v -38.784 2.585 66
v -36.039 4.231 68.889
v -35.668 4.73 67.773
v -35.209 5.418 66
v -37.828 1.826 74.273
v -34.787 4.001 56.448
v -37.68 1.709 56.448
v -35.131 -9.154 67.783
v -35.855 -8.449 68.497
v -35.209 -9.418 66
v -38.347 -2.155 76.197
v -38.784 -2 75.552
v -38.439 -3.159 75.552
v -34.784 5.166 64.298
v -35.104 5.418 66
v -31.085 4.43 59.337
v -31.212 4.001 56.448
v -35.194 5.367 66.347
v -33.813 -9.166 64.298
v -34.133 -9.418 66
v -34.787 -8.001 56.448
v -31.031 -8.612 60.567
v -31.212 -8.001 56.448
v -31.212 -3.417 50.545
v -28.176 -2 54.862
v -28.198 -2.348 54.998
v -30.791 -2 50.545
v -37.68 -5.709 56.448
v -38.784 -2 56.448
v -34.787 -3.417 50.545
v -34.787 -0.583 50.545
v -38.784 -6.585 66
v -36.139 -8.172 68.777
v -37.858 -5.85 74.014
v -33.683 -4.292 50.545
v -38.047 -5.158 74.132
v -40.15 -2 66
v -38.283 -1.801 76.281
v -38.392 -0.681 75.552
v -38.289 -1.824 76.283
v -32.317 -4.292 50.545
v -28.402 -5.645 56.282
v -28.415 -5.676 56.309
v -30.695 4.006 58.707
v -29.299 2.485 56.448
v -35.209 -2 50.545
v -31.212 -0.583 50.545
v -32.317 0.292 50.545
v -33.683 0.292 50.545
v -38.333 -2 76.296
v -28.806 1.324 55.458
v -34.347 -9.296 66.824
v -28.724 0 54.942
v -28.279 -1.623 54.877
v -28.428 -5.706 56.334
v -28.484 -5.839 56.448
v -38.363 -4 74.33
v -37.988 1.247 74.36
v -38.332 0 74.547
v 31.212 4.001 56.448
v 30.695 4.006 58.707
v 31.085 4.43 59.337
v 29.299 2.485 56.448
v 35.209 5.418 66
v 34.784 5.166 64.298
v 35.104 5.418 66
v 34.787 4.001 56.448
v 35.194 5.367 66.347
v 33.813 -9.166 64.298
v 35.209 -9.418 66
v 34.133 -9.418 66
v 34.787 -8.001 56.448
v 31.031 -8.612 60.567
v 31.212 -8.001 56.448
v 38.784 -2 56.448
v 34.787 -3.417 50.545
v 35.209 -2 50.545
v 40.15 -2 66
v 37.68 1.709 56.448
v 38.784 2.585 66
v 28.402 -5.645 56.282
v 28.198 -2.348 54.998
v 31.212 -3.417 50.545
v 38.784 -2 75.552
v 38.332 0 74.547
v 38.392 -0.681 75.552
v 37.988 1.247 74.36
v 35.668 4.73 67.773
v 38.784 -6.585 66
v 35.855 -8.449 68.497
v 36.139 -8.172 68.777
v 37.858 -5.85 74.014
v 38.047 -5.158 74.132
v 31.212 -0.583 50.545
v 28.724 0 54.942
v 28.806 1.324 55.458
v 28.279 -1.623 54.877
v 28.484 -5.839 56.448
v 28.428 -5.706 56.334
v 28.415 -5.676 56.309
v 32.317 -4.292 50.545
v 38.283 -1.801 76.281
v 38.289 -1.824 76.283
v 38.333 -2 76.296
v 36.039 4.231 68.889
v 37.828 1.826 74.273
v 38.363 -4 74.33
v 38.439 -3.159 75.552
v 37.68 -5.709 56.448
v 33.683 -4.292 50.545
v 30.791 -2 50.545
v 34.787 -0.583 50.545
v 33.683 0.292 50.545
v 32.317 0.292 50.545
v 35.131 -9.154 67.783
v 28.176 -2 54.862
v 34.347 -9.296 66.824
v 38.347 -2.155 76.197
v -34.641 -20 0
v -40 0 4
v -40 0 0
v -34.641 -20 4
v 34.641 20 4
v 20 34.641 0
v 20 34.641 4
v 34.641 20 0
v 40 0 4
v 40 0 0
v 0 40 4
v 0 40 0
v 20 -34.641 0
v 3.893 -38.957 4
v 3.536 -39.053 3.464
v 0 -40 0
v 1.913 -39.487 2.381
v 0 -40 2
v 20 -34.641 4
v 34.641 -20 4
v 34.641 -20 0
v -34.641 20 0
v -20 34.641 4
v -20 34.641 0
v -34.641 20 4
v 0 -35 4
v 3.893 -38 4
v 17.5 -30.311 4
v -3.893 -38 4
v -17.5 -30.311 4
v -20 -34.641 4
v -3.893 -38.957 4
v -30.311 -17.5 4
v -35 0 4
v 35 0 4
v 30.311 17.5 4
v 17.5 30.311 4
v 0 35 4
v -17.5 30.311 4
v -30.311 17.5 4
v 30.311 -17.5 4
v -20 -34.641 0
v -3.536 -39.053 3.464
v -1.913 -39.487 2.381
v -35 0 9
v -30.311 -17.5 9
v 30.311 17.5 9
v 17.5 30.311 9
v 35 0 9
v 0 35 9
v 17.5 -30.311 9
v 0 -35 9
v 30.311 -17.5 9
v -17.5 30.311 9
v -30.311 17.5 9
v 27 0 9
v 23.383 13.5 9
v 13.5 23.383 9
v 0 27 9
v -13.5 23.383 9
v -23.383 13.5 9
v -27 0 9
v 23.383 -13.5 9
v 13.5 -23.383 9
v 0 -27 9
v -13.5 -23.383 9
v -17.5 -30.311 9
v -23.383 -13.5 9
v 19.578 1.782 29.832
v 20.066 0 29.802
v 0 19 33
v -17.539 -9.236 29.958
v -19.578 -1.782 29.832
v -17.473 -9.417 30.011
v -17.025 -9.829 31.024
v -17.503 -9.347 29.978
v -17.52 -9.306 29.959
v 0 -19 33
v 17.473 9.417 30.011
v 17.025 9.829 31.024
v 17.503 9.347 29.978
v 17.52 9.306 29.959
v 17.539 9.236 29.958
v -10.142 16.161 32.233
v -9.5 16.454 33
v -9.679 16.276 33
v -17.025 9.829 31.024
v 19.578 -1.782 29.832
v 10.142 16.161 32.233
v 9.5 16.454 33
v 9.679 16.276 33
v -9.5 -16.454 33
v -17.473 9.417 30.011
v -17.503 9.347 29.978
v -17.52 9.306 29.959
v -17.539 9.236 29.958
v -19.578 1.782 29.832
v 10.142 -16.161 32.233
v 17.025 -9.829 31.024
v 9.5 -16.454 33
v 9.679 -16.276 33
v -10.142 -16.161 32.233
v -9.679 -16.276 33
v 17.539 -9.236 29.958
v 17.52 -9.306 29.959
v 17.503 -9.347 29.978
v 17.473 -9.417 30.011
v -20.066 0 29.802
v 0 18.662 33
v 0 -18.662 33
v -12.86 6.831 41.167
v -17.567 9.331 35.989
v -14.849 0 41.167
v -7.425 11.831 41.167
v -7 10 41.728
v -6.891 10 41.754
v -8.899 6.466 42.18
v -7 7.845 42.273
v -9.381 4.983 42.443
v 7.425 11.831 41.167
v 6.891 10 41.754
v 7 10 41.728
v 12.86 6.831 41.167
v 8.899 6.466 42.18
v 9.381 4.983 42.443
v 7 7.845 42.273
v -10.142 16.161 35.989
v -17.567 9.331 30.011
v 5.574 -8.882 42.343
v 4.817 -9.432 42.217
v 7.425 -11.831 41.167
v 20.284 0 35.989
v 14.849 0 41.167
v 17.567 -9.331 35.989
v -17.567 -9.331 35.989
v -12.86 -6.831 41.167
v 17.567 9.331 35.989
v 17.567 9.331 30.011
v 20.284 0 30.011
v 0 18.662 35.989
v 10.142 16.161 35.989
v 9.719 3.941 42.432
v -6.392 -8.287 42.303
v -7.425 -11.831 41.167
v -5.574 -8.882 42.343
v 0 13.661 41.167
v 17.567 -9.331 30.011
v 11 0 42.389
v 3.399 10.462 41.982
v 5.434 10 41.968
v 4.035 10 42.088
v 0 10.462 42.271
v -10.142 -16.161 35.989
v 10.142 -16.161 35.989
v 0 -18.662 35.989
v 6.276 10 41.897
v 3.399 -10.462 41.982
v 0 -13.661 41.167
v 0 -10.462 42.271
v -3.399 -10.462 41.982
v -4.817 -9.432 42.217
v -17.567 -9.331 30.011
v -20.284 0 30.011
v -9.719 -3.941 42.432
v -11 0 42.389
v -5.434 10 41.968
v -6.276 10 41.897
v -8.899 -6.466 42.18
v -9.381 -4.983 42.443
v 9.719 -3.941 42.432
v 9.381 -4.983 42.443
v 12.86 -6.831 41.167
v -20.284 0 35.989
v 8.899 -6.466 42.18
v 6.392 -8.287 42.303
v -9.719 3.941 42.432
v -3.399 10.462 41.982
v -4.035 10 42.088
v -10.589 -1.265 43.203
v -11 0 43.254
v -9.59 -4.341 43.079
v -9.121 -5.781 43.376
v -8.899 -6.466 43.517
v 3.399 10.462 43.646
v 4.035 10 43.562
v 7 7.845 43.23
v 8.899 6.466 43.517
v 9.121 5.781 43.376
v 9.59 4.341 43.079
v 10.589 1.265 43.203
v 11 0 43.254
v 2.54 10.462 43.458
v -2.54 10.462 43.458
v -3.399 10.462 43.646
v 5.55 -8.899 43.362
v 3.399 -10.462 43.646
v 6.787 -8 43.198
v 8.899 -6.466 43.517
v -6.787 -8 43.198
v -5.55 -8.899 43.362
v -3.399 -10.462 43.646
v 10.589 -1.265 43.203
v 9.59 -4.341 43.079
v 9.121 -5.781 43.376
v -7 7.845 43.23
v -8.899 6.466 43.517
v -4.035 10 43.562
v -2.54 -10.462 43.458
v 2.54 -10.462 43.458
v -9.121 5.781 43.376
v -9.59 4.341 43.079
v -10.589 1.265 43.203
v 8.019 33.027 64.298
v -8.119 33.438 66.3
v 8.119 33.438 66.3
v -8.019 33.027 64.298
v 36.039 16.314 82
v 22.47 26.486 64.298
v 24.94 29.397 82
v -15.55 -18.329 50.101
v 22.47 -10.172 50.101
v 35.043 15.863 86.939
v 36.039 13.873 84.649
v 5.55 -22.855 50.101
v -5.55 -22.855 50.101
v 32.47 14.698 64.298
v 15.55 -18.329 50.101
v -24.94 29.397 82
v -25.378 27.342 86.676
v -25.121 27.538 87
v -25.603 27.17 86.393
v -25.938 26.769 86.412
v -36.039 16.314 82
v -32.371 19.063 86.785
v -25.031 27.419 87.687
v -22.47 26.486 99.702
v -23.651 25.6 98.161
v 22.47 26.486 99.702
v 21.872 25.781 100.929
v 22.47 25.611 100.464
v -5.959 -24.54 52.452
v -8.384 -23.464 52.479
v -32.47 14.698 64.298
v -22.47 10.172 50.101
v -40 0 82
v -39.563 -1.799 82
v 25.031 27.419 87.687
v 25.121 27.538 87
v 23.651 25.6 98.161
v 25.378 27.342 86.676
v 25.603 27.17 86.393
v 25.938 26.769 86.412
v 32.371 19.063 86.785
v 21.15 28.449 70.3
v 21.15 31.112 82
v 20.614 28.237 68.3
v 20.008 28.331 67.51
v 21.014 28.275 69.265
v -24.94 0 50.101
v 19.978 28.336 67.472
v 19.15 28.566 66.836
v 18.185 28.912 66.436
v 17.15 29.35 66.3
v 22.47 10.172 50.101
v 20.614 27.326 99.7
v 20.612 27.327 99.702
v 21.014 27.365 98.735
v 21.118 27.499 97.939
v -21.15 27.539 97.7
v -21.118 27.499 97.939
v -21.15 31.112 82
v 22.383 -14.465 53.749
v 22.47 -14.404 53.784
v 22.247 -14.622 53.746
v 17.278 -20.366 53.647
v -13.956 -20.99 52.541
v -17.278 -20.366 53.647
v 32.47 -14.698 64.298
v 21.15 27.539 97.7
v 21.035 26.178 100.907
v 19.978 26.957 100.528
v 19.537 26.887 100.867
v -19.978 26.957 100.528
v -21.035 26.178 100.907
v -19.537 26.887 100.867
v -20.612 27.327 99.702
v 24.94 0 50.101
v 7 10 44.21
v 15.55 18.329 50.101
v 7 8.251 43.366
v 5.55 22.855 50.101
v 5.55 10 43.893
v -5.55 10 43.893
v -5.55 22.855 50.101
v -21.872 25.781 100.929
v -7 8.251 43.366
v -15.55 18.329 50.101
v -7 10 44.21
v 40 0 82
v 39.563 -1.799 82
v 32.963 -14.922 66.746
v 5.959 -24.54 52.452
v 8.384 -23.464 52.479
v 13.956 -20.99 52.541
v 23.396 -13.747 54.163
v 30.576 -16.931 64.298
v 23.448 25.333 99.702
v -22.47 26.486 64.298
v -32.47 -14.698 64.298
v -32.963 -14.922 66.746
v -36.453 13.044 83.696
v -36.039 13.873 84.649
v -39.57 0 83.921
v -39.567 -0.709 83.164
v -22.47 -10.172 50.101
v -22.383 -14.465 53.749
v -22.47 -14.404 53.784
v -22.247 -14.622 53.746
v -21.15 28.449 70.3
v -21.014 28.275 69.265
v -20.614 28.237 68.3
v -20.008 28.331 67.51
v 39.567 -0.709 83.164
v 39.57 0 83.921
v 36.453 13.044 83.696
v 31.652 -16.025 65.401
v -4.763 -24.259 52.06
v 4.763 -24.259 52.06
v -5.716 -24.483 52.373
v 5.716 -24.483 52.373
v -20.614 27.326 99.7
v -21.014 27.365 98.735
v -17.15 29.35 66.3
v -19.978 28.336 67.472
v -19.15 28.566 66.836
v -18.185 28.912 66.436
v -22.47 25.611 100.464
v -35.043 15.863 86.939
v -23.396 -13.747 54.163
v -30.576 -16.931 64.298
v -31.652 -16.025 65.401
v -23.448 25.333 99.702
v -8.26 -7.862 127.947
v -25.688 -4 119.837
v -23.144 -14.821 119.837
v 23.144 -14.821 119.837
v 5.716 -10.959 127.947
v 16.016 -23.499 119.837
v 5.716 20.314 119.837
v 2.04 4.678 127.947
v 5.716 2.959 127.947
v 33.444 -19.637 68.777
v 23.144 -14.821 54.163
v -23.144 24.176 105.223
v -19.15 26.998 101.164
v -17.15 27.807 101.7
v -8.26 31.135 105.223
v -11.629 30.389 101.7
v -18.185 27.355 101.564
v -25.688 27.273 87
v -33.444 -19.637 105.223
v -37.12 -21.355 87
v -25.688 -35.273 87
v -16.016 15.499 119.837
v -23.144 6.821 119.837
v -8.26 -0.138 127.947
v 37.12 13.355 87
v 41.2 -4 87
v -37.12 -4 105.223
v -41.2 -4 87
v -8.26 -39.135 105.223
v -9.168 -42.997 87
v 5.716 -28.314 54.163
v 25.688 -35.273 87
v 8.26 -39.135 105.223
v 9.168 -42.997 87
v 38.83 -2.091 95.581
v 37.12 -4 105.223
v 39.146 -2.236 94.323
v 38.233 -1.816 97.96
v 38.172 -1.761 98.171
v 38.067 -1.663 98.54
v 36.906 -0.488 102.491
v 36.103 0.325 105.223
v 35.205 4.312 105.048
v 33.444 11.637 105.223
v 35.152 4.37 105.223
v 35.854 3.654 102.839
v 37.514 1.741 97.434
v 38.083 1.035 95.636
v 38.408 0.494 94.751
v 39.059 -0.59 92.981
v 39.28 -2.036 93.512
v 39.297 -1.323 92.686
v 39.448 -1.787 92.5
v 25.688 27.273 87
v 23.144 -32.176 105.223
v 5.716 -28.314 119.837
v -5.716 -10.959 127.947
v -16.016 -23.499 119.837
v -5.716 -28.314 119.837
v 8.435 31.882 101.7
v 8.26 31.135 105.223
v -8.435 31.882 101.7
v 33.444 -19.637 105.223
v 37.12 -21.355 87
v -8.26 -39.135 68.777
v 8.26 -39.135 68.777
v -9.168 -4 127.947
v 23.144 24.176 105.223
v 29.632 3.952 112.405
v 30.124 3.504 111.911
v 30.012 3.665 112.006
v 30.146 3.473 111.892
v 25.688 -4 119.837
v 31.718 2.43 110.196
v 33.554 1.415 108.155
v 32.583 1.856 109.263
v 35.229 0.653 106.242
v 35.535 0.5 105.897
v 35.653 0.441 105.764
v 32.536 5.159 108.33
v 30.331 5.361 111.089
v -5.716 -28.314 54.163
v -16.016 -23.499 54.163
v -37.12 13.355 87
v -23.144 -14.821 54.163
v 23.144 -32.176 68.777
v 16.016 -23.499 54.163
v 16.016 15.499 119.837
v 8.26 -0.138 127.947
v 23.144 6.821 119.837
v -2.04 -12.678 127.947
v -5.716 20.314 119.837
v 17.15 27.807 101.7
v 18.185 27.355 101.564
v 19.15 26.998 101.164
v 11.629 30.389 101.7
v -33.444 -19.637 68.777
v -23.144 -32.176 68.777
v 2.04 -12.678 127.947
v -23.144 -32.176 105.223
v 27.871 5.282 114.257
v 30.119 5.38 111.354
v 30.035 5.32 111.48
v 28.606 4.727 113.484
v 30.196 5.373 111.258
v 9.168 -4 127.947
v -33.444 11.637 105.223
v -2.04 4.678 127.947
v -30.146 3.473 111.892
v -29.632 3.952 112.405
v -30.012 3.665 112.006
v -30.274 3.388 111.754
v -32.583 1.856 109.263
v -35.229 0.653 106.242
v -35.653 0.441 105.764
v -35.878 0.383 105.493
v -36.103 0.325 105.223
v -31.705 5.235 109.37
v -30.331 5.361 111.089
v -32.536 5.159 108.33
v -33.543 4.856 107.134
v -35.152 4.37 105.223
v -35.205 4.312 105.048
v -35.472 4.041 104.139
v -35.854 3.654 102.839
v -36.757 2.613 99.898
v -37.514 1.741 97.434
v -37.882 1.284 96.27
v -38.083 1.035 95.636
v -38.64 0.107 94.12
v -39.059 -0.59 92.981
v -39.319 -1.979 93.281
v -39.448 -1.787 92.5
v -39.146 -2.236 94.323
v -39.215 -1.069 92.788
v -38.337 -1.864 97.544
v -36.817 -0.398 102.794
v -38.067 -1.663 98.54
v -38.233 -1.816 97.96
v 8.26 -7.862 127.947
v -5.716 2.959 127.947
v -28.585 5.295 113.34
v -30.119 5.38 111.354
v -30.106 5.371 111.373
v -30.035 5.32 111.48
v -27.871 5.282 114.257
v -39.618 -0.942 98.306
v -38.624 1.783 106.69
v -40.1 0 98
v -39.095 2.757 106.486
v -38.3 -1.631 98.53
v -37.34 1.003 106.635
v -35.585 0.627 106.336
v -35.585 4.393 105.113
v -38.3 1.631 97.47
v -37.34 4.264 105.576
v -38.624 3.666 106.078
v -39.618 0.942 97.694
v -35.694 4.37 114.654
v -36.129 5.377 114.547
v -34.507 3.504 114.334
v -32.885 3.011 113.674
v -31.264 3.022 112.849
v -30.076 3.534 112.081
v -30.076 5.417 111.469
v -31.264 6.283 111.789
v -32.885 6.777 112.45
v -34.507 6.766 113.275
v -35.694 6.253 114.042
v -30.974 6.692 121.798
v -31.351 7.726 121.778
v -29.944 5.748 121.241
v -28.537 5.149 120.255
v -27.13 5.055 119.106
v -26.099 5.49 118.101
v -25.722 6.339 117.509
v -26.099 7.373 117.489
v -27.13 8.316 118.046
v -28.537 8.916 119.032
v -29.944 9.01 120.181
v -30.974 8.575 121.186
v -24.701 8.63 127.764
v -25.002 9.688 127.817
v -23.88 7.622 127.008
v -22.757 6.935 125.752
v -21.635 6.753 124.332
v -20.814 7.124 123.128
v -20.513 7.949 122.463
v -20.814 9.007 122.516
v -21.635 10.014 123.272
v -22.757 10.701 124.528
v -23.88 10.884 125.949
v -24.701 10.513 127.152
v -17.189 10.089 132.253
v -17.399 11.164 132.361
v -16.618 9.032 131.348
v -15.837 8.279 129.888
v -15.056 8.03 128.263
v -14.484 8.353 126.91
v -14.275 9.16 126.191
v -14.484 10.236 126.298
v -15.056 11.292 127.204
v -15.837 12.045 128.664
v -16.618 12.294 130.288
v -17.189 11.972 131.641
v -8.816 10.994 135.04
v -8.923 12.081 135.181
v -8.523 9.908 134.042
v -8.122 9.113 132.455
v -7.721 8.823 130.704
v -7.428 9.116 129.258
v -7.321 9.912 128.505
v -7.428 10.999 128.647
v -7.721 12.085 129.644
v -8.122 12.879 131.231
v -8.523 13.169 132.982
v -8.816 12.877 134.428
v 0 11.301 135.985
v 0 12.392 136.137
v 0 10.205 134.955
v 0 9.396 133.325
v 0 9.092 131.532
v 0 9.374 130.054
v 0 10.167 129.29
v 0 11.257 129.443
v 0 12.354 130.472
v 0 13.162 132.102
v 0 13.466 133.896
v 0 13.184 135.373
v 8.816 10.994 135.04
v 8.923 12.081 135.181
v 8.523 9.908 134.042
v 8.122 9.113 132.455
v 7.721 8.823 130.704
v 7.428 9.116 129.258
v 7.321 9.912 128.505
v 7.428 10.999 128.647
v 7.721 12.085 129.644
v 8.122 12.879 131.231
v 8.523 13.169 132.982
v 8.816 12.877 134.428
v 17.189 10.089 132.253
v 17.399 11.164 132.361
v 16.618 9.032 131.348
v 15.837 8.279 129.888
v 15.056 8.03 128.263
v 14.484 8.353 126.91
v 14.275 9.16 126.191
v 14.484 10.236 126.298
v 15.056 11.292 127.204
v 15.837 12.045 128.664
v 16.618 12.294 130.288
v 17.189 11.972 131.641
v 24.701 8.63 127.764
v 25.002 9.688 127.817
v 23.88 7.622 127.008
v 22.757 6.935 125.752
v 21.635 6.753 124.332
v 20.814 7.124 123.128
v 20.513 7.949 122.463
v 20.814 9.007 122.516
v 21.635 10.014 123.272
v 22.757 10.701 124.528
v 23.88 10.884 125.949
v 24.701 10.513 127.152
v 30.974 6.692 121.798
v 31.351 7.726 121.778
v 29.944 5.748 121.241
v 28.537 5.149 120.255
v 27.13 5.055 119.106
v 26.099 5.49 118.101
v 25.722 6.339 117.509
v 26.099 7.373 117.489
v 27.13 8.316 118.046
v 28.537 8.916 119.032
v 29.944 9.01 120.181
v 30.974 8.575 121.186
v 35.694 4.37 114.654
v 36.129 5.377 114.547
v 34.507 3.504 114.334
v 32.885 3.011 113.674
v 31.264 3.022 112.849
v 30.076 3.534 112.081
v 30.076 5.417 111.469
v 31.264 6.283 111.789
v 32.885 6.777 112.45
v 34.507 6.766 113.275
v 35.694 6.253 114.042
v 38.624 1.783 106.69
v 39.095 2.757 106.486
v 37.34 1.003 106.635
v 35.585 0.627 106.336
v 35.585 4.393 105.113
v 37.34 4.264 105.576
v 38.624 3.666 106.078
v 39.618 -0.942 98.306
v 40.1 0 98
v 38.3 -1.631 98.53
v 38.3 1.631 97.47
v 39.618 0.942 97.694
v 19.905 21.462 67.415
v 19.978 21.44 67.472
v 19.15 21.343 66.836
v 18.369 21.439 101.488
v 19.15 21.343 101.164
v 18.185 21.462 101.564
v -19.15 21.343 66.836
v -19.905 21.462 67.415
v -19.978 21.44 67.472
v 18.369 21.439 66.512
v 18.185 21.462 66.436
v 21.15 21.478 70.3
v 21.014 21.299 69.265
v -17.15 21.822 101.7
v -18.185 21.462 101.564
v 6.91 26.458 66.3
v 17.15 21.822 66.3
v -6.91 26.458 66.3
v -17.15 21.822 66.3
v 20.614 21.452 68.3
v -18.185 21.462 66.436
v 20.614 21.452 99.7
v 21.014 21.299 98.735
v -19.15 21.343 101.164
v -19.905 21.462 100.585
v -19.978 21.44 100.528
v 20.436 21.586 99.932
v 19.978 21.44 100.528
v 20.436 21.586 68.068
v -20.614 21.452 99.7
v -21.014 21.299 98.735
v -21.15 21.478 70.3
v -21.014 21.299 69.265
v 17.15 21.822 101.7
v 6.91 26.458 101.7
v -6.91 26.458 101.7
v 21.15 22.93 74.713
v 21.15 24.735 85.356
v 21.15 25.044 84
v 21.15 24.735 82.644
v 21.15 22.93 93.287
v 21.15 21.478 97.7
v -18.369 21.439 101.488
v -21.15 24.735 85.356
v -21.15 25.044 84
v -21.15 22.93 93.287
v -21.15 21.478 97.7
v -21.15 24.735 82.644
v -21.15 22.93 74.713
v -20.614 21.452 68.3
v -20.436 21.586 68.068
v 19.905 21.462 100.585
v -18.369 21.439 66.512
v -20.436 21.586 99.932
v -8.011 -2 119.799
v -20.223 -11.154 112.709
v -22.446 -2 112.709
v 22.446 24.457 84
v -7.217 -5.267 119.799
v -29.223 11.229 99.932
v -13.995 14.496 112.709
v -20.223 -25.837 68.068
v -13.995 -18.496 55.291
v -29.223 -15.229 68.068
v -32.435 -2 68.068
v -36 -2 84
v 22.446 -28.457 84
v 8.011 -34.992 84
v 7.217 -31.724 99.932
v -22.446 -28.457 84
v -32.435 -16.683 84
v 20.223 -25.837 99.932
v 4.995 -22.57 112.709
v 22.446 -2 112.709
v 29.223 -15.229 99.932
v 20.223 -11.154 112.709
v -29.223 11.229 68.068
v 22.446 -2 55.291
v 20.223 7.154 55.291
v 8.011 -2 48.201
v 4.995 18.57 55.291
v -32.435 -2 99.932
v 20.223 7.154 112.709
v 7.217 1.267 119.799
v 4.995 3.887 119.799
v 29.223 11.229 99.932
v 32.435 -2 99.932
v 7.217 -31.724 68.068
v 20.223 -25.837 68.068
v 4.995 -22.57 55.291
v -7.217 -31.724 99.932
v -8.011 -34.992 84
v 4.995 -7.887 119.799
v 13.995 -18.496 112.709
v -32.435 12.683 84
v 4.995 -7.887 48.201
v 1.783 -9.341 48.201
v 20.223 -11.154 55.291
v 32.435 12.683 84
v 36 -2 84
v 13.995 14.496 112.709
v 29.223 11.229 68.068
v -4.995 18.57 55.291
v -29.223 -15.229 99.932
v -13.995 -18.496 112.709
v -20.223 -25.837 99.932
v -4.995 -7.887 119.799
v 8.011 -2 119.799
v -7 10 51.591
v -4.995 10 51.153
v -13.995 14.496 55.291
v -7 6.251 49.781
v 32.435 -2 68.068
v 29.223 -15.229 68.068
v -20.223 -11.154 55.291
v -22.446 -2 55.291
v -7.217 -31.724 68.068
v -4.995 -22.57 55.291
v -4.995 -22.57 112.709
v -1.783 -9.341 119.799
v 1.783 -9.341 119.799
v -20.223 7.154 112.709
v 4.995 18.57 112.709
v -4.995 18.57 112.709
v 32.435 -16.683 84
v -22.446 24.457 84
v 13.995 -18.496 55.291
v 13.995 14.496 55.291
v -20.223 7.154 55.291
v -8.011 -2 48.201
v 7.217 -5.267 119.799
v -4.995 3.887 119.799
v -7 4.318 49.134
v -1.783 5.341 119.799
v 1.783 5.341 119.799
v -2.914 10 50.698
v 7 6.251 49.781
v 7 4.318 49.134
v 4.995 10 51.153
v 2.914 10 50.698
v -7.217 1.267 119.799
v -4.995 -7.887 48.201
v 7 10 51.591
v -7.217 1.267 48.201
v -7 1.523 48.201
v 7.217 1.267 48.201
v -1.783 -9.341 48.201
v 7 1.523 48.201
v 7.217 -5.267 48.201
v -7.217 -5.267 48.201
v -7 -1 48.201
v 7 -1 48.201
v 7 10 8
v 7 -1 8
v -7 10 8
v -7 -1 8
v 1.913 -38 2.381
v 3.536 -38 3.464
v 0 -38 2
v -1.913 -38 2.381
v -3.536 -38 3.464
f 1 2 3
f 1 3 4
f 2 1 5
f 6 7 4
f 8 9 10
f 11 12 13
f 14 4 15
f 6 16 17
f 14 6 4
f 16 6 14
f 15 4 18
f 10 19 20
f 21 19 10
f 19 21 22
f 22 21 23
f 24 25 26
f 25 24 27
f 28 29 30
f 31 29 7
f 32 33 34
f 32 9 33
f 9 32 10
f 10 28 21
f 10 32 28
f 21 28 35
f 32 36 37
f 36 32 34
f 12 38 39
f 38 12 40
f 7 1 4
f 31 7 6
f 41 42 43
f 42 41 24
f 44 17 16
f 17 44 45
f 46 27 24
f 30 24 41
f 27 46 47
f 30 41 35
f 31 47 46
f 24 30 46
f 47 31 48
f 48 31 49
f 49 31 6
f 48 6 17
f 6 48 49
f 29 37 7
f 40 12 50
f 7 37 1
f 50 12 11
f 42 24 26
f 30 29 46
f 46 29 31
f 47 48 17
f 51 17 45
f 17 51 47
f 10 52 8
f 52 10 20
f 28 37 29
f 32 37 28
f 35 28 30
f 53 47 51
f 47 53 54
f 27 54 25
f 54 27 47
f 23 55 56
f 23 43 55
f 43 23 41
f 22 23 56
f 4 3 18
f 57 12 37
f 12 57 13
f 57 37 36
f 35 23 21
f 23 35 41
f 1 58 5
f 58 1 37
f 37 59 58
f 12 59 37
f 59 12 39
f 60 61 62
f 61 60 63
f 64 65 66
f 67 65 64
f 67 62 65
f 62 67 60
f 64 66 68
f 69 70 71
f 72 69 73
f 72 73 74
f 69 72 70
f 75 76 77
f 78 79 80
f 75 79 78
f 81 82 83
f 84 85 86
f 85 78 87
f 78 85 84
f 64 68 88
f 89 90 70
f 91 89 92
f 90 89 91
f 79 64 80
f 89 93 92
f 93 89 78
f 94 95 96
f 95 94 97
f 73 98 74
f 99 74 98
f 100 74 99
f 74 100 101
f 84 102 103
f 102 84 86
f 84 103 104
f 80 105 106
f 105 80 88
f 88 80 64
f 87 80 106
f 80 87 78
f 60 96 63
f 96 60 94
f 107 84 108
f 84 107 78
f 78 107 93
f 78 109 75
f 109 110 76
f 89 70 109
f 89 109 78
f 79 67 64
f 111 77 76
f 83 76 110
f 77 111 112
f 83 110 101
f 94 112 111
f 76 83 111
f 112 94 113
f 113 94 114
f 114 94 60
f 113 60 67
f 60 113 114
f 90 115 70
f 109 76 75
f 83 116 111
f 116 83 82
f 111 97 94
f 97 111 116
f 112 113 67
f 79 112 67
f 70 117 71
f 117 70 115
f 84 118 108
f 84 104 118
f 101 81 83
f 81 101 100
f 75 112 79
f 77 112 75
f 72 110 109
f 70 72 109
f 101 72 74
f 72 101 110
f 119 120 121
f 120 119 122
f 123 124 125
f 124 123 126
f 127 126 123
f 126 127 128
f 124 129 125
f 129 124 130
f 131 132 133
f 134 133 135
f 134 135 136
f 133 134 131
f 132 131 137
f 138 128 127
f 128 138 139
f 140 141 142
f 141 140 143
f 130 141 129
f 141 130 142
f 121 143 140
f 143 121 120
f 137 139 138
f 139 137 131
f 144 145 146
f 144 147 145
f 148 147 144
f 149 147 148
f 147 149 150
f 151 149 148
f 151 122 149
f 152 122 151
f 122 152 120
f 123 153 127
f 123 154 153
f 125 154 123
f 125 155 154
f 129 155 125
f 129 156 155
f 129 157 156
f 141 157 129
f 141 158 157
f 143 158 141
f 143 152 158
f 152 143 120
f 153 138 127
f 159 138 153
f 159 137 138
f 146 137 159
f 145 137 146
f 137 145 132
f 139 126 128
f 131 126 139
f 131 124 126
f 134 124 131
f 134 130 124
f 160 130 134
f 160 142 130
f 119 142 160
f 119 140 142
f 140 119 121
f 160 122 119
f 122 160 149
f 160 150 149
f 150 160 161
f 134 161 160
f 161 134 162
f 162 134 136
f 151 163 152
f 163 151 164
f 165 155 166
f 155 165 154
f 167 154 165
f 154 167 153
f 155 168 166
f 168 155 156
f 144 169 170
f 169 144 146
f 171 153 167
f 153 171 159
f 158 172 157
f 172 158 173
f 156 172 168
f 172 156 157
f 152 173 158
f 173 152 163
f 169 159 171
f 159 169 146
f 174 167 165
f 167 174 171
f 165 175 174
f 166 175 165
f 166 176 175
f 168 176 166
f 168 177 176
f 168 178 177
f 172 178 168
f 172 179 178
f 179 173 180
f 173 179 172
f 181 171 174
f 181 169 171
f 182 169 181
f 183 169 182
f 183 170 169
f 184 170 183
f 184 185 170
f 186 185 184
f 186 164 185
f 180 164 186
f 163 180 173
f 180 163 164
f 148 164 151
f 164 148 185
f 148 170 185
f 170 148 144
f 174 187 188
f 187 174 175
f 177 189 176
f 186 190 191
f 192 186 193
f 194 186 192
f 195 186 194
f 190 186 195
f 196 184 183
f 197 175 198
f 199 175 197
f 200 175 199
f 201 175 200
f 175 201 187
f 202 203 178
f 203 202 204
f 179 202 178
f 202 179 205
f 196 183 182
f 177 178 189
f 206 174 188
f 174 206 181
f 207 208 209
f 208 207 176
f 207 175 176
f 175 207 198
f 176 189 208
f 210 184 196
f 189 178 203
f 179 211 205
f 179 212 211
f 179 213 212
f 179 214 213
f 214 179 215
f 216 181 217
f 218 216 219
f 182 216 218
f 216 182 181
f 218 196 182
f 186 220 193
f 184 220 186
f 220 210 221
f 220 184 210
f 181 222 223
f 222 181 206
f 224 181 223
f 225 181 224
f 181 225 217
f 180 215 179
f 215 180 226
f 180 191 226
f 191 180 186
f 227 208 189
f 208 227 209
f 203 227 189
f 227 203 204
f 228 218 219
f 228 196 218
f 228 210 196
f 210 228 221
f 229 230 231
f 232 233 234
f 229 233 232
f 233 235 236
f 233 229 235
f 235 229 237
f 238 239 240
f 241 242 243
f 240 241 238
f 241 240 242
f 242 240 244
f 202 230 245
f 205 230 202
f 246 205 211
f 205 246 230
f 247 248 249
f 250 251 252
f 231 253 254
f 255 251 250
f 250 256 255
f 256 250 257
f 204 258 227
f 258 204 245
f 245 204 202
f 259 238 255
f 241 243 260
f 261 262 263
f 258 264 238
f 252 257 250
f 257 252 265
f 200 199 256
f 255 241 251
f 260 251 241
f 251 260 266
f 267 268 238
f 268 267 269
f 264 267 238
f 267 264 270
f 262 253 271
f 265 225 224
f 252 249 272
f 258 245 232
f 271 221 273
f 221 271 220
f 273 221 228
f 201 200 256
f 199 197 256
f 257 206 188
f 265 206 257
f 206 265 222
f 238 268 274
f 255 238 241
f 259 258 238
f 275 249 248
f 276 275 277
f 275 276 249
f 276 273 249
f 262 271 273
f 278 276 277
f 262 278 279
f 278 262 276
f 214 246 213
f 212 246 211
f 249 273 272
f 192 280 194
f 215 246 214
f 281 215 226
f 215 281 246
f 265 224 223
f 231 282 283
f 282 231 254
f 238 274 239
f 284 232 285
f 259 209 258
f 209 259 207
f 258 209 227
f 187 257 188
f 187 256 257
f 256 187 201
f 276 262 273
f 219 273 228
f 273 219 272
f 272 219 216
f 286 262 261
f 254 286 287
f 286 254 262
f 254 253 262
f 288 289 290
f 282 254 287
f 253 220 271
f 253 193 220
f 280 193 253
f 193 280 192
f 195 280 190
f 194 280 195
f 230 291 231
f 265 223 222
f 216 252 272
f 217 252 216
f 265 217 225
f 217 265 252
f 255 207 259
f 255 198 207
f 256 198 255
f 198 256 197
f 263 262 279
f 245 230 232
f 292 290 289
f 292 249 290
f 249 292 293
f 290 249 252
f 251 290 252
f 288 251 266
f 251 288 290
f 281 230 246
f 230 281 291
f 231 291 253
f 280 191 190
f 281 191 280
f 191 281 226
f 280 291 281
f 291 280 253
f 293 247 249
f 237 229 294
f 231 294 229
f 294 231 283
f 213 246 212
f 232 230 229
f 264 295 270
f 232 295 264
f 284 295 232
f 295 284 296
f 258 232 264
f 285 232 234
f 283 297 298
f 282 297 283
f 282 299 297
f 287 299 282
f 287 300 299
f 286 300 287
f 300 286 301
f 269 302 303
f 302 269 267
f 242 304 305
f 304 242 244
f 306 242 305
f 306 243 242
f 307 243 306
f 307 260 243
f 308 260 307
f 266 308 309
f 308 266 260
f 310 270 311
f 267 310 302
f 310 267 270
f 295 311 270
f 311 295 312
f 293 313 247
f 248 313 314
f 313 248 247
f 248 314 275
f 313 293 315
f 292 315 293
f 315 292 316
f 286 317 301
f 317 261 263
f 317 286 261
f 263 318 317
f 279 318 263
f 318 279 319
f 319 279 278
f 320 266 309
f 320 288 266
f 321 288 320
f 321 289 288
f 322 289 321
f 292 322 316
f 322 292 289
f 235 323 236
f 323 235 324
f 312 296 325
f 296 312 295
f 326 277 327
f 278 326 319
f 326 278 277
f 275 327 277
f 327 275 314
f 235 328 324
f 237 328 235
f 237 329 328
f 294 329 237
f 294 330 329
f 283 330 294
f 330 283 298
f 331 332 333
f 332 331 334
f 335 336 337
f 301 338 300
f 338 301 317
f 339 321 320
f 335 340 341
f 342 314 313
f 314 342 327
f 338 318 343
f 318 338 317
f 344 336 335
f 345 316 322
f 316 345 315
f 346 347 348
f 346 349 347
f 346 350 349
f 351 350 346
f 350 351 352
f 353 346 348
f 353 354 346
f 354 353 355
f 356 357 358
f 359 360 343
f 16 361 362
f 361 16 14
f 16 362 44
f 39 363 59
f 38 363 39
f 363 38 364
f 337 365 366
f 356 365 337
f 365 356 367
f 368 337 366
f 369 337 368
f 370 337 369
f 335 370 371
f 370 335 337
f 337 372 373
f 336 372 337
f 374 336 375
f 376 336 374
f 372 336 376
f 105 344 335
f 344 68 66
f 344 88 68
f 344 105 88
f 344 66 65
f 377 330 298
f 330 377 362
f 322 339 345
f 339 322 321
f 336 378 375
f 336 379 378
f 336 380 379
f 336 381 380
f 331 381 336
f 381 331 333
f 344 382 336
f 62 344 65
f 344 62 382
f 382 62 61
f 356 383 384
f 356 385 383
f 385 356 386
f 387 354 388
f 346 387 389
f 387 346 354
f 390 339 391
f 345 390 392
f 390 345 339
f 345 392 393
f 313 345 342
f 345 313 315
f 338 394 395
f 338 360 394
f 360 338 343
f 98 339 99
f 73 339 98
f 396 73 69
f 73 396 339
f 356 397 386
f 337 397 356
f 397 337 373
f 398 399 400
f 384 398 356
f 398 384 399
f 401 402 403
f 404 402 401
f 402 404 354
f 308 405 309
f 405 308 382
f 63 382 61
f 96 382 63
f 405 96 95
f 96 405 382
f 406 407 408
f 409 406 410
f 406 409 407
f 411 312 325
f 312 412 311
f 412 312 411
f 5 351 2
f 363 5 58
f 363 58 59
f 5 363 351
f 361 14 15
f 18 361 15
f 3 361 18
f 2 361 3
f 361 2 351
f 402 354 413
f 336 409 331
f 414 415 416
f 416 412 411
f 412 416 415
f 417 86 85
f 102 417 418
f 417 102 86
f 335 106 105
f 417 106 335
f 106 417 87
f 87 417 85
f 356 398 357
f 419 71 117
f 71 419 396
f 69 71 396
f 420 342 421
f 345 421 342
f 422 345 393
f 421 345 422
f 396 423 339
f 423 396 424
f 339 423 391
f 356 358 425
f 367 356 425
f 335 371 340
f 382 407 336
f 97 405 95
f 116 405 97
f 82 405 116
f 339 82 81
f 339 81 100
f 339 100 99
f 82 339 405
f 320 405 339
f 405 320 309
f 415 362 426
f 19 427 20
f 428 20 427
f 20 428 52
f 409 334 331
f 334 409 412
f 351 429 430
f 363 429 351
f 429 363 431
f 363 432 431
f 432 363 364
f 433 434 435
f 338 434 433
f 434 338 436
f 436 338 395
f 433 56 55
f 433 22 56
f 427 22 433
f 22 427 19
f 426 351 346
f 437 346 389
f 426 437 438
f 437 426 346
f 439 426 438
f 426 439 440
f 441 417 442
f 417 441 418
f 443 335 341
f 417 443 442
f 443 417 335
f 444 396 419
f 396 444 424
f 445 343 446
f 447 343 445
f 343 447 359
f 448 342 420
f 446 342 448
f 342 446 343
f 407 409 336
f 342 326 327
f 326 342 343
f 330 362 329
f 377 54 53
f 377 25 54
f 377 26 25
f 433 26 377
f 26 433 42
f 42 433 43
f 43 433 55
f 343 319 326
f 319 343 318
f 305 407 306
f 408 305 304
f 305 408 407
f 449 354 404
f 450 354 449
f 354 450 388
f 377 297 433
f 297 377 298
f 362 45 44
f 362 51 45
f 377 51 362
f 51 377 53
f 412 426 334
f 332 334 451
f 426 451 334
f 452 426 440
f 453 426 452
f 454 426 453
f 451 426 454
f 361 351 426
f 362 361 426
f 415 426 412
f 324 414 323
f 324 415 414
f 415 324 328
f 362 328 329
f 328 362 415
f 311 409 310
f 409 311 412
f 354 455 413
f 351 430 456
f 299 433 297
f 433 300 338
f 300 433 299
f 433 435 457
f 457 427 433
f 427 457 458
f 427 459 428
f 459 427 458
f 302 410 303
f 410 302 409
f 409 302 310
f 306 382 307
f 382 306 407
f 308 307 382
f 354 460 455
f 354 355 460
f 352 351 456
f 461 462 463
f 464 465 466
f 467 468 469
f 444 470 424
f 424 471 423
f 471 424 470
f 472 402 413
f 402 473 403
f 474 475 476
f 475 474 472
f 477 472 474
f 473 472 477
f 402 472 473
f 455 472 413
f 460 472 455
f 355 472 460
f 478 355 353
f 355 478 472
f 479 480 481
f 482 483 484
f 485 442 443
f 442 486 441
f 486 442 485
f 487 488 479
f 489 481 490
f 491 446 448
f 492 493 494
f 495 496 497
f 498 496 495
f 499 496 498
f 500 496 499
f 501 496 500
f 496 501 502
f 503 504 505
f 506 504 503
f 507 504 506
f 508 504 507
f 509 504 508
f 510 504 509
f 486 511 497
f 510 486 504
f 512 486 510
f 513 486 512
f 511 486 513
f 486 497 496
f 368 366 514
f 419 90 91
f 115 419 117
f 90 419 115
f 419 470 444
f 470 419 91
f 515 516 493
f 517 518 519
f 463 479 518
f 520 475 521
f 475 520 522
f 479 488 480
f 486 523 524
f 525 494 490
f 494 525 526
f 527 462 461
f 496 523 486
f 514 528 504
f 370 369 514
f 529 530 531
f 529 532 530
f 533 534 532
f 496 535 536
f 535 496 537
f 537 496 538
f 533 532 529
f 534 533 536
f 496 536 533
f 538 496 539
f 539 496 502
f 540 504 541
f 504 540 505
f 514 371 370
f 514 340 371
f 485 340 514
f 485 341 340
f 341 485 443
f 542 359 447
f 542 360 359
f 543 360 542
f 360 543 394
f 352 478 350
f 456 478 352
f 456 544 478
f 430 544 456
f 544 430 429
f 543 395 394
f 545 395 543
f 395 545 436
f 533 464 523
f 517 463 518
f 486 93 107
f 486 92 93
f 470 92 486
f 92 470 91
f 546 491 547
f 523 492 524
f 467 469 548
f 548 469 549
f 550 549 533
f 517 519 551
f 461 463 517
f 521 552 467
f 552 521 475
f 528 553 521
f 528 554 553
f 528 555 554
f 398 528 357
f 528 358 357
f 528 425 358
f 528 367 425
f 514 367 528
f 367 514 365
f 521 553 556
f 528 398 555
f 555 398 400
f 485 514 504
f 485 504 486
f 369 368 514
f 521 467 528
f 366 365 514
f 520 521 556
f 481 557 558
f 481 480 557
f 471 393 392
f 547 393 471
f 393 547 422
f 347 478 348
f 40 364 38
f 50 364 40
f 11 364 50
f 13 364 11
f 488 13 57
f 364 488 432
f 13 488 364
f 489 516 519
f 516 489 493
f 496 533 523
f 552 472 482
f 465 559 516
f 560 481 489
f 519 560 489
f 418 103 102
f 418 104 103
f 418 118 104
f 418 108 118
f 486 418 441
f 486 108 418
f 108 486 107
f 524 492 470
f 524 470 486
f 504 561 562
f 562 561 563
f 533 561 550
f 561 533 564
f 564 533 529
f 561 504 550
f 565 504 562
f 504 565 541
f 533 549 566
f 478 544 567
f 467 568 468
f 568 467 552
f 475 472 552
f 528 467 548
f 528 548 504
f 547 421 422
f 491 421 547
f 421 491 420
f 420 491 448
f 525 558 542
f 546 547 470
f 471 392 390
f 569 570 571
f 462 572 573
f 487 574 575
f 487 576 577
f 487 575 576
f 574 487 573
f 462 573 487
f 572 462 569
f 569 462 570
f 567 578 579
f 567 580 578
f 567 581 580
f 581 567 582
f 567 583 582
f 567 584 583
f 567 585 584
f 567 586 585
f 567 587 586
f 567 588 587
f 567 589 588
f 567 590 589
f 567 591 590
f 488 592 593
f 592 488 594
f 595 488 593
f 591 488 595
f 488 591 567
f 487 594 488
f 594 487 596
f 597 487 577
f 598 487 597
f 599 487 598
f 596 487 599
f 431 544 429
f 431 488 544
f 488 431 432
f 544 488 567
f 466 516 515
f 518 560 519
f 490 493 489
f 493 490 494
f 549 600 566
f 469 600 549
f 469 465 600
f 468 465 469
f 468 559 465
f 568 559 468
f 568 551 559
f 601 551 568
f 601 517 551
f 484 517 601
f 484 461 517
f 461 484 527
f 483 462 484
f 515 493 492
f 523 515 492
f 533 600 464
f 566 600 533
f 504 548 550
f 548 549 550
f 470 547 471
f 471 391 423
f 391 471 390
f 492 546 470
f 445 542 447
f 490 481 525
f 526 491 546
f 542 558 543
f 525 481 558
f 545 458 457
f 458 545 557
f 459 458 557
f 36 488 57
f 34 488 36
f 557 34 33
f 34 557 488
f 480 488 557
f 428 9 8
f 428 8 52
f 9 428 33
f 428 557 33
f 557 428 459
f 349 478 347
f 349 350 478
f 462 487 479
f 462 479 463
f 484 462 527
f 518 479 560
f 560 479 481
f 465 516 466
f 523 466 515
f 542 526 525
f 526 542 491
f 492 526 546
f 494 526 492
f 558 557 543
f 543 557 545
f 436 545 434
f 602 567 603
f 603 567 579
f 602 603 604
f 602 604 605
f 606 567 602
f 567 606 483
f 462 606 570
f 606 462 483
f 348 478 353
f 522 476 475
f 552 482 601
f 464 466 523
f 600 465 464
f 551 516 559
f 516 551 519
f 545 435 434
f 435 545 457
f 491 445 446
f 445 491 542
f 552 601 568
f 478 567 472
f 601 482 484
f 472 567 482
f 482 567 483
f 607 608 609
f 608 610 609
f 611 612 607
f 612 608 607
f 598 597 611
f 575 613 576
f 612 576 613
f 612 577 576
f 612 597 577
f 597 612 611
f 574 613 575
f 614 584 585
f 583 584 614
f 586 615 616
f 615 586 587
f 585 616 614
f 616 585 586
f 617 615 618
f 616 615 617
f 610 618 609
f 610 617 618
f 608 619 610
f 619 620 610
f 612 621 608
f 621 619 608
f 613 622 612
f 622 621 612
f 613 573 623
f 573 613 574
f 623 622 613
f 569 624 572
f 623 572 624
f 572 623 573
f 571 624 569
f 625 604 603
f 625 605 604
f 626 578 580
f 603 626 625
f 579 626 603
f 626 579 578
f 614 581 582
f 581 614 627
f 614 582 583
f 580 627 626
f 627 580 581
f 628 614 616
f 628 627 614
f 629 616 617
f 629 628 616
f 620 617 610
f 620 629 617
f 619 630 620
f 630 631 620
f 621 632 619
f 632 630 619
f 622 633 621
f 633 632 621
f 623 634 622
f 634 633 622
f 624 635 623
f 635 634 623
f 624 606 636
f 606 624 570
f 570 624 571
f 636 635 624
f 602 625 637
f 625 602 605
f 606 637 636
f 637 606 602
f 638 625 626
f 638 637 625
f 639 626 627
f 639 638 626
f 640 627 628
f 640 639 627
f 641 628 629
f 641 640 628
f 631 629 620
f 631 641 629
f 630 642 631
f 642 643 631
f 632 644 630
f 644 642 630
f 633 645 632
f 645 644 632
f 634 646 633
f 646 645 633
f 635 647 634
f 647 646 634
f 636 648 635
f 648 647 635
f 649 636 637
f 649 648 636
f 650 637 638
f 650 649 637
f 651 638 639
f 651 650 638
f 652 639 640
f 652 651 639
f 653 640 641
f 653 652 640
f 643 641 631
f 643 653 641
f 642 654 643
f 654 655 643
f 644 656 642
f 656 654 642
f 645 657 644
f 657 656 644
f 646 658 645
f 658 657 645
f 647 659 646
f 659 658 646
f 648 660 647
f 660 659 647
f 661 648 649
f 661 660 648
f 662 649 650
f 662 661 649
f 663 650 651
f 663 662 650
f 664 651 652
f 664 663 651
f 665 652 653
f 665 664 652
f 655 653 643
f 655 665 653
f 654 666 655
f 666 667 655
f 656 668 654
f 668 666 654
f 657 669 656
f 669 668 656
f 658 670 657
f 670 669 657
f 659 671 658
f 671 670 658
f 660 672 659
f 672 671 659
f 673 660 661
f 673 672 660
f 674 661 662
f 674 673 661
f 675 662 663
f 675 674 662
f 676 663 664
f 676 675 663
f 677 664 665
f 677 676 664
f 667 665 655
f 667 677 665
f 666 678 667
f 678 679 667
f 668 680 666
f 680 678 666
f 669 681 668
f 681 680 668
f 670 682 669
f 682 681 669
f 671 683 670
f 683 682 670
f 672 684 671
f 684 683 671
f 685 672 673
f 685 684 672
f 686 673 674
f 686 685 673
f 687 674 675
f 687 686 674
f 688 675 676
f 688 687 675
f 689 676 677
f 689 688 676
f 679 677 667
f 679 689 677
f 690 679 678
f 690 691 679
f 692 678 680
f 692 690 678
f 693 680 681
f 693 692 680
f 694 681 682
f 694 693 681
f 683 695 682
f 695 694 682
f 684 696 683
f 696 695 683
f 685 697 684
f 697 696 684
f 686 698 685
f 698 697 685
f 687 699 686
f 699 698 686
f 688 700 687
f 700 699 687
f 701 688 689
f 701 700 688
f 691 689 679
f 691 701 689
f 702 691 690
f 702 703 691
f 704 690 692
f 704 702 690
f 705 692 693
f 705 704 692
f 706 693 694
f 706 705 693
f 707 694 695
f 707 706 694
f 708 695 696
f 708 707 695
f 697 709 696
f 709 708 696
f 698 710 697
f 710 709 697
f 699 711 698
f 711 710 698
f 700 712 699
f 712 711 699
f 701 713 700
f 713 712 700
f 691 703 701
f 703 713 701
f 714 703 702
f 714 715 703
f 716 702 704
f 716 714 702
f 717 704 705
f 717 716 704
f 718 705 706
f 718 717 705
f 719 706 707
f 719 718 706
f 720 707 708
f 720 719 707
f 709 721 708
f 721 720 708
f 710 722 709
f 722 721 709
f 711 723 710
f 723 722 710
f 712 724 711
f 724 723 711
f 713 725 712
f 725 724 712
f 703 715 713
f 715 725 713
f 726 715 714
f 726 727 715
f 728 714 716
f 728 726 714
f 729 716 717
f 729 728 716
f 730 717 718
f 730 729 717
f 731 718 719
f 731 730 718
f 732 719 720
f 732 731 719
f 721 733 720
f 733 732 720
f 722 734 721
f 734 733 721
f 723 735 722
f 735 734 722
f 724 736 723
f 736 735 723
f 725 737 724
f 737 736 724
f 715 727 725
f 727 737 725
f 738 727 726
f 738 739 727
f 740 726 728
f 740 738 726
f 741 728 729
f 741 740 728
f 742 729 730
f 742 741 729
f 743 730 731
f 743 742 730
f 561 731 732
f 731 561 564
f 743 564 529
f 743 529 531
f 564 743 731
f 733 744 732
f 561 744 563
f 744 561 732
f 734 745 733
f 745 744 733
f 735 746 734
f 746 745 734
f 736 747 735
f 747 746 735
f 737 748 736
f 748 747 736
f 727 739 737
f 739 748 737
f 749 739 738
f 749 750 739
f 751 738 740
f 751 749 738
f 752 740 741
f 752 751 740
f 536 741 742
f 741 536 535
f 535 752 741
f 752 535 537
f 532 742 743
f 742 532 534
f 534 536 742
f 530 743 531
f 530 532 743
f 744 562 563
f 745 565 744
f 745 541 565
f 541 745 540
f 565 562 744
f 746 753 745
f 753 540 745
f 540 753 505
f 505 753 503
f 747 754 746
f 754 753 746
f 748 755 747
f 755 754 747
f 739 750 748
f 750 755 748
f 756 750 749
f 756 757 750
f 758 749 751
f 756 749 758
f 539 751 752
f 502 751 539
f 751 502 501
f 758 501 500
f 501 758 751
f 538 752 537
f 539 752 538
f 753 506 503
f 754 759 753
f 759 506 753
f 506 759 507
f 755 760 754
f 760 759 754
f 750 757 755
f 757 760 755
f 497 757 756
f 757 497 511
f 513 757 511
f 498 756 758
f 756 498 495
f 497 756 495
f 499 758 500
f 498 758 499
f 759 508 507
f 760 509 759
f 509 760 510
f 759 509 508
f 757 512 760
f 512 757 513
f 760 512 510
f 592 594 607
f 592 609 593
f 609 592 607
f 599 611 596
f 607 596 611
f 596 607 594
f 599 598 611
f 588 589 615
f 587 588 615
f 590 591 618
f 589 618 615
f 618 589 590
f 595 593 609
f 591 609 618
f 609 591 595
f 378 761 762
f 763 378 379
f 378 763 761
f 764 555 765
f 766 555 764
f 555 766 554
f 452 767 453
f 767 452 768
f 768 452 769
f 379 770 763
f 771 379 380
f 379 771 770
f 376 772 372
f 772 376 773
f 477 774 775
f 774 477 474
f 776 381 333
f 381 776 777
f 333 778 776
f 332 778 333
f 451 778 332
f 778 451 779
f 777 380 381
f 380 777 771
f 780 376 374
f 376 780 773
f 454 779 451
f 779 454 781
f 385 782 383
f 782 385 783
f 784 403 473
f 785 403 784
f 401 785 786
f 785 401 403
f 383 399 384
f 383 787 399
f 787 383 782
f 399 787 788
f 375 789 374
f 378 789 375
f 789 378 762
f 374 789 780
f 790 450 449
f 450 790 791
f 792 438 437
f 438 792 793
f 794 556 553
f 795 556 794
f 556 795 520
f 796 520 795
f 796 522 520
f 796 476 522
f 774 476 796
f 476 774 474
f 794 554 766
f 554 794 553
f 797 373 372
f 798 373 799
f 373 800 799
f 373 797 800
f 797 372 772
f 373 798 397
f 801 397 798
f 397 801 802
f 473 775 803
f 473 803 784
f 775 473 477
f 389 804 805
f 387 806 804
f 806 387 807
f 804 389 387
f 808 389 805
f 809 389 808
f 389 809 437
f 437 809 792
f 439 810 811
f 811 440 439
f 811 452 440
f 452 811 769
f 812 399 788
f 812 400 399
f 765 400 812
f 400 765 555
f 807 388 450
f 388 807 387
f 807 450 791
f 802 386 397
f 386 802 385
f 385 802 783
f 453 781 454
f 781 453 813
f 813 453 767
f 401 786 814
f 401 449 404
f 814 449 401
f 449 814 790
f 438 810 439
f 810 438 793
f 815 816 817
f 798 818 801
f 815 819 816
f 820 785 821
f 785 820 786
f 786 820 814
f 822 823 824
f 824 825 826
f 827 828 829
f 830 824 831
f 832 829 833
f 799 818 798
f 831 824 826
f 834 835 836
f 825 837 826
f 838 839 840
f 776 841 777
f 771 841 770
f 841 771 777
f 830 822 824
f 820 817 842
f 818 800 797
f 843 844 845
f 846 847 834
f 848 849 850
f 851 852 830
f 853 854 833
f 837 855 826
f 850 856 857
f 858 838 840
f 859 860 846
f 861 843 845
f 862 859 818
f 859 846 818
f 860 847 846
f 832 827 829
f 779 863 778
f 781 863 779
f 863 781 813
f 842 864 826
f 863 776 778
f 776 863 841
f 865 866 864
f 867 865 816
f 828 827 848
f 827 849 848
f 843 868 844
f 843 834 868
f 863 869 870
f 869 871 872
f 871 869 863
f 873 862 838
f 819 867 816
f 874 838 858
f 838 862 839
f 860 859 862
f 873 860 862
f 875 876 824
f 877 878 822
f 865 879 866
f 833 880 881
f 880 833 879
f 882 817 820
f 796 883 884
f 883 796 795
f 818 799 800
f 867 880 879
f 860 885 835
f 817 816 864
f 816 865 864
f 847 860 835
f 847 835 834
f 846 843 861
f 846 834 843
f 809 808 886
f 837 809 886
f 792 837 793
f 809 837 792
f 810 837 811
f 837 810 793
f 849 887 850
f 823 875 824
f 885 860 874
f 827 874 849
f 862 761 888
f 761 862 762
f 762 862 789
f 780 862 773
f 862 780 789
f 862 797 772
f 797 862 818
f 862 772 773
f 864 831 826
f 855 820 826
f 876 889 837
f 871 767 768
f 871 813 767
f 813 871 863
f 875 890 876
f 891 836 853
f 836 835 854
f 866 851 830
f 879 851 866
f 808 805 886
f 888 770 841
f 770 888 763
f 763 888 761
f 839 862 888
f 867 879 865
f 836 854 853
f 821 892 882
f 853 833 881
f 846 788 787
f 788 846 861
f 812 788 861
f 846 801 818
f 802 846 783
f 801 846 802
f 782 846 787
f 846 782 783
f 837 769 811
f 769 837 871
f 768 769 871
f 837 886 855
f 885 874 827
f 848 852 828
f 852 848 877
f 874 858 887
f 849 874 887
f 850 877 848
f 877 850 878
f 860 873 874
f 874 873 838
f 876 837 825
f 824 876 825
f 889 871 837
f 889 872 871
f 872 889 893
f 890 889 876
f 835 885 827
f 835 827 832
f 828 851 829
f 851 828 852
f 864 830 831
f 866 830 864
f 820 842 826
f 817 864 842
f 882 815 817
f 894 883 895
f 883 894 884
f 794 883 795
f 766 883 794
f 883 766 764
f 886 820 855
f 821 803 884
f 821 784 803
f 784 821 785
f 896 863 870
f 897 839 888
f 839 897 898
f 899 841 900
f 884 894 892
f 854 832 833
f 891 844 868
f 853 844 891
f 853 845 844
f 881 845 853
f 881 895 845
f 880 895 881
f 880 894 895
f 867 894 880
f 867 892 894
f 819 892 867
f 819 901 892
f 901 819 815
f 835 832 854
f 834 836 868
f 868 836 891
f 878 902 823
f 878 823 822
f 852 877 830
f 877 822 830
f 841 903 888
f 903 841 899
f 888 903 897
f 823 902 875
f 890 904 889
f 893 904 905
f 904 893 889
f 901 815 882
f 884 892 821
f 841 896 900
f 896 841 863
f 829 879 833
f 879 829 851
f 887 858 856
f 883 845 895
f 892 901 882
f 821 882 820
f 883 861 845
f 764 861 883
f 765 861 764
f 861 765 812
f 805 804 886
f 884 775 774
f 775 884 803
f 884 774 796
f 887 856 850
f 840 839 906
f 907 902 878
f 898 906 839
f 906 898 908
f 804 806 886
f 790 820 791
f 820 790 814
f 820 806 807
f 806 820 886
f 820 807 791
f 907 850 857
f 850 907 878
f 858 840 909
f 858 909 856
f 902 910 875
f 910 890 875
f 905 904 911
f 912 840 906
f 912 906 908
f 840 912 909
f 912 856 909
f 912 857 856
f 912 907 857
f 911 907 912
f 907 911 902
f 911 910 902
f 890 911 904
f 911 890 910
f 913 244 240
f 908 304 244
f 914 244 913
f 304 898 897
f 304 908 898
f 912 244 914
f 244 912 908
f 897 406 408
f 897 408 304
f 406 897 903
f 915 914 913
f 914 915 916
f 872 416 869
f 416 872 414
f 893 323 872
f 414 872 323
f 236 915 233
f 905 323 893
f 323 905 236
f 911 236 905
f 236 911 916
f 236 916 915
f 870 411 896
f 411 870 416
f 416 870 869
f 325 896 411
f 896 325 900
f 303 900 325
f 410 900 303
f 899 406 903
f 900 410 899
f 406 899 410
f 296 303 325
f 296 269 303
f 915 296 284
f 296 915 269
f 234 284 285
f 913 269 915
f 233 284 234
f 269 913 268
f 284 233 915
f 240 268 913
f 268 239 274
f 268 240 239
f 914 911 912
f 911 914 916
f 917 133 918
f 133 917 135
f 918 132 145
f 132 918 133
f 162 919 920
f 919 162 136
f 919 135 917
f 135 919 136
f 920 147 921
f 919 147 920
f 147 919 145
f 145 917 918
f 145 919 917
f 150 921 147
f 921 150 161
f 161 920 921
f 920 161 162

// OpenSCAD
// =====================================================================
//  Chibi Sera bust for the Sera-vice (LOLIN S3 Mini Pro) — v0 draft
//  Marcus: tweak the numbers at the top, everything follows.
//  Units: mm. Front of the bust faces +Y. Up is +Z.
//  Print: bust body (part="body") and face frame (part="frame").
// =====================================================================

// ---------- Board (from LOLIN docs; screen/button spots = caliper-check) ----------
BOARD_W = 34.3;      // X
BOARD_H = 25.4;      // Z  (landscape, exactly as the firmware draws)
CLEAR   = 0.6;       // pocket clearance per side
SCREEN_WIN = 20;     // square window for the 0.85" TFT glass
SCREEN_DY  = 1.5;    // screen centre above board centre (CALIPER-CHECK!)
BTN_D    = 5.5;      // button holes in the frame
BTN_DX   = 9.0;      // button spacing from centre (CALIPER-CHECK!)
BTN_DZ   = -11.0;     // buttons below screen centre (CALIPER-CHECK!)

// ---------- Bust proportions ----------
HEAD_R   = 40;       // head sphere radius (low-poly faceted)
HEAD_Z   = 82;       // head centre height
WALL     = 3;        // shell wall thickness

part = "body";       // "body" or "frame"

// rounded box helper (flat in Y)
module rbox(w,h,d,r){
  hull(){ for(x=[-1,1], z=[-1,1])
    translate([x*(w/2-r), 0, z*(h/2-r)]) rotate([90,0,0]) cylinder(h=d, r=r, center=true, $fn=24);
  }
}

// ---------- solid bust ----------
module bust_solid(){
  color([0.45,0.45,0.5]) cylinder(h=4, r=40, $fn=12);
  color([0.55,0.55,0.6]) translate([0,0,4]) cylinder(h=5, r=35, $fn=12);
  color([0.16,0.55,0.36]) translate([0,0,9]) cylinder(h=24, r1=27, r2=19, $fn=12);
  color([0.16,0.55,0.36]) translate([0,0,33]) scale([1,0.92,0.55]) sphere(r=21, $fn=12);
  color([0.95,0.76,0.6]) translate([0,0,38]) cylinder(h=14, r=11, $fn=10);
  color([0.95,0.76,0.6]) translate([0,0,HEAD_Z]) scale([1,0.94,1.02]) sphere(r=HEAD_R, $fn=14);
  color([0.35,0.2,0.1]) translate([0,-4,HEAD_Z+5]) scale([1.03,1.0,1.05]) sphere(r=HEAD_R, $fn=14);
  for(x=[-1,1]) color([0.35,0.2,0.1])
    translate([x*33,-2,HEAD_Z-16]) scale([0.55,0.6,1.25]) sphere(r=13, $fn=10);
  color([0.1,0.65,0.4]) translate([0,0,HEAD_Z+16]) rotate([72,0,0]) scale([1,1,0.55])
    rotate_extrude(angle=360, $fn=28) translate([36.5,0,0]) circle(r=3.6, $fn=12);
}

// ---------- subtractions ----------
module bust_cuts(){
  translate([0, 27, HEAD_Z+2]) rbox(BOARD_W+2*CLEAR, BOARD_H+2*CLEAR, 16, 3);
  translate([0, 30, HEAD_Z+2]) rbox(BOARD_W+8, BOARD_H+10, 22, 4);
  translate([0,-2,HEAD_Z+2]) scale([1,0.94,1.02]) sphere(r=HEAD_R-WALL-1, $fn=14);
  translate([-7, -1, 8]) cube([14, 11, 44]);
  translate([0,-38,7]) rotate([90,0,0]) cylinder(h=10, r=5, $fn=16);
}

module body_part(){ difference(){ bust_solid(); bust_cuts(); } }

// ---------- face frame (snaps over the pocket) ----------
module frame_part(){
  color([0.3,0.3,0.35]) difference(){
    translate([0, 33.5, HEAD_Z+2]) rbox(BOARD_W+9, BOARD_H+9, 3.2, 5);
    translate([0, 33.5, HEAD_Z+2+SCREEN_DY]) cube([SCREEN_WIN, 6, SCREEN_WIN], center=true);
    for(x=[-BTN_DX, 0, BTN_DX])
      translate([x, 33.5, HEAD_Z+2+BTN_DZ]) rotate([90,0,0]) cylinder(h=6, r=BTN_D/2, center=true, $fn=16);
  }
}

if (part == "body") body_part(); else if (part == "frame") frame_part(); else { body_part(); frame_part(); }
